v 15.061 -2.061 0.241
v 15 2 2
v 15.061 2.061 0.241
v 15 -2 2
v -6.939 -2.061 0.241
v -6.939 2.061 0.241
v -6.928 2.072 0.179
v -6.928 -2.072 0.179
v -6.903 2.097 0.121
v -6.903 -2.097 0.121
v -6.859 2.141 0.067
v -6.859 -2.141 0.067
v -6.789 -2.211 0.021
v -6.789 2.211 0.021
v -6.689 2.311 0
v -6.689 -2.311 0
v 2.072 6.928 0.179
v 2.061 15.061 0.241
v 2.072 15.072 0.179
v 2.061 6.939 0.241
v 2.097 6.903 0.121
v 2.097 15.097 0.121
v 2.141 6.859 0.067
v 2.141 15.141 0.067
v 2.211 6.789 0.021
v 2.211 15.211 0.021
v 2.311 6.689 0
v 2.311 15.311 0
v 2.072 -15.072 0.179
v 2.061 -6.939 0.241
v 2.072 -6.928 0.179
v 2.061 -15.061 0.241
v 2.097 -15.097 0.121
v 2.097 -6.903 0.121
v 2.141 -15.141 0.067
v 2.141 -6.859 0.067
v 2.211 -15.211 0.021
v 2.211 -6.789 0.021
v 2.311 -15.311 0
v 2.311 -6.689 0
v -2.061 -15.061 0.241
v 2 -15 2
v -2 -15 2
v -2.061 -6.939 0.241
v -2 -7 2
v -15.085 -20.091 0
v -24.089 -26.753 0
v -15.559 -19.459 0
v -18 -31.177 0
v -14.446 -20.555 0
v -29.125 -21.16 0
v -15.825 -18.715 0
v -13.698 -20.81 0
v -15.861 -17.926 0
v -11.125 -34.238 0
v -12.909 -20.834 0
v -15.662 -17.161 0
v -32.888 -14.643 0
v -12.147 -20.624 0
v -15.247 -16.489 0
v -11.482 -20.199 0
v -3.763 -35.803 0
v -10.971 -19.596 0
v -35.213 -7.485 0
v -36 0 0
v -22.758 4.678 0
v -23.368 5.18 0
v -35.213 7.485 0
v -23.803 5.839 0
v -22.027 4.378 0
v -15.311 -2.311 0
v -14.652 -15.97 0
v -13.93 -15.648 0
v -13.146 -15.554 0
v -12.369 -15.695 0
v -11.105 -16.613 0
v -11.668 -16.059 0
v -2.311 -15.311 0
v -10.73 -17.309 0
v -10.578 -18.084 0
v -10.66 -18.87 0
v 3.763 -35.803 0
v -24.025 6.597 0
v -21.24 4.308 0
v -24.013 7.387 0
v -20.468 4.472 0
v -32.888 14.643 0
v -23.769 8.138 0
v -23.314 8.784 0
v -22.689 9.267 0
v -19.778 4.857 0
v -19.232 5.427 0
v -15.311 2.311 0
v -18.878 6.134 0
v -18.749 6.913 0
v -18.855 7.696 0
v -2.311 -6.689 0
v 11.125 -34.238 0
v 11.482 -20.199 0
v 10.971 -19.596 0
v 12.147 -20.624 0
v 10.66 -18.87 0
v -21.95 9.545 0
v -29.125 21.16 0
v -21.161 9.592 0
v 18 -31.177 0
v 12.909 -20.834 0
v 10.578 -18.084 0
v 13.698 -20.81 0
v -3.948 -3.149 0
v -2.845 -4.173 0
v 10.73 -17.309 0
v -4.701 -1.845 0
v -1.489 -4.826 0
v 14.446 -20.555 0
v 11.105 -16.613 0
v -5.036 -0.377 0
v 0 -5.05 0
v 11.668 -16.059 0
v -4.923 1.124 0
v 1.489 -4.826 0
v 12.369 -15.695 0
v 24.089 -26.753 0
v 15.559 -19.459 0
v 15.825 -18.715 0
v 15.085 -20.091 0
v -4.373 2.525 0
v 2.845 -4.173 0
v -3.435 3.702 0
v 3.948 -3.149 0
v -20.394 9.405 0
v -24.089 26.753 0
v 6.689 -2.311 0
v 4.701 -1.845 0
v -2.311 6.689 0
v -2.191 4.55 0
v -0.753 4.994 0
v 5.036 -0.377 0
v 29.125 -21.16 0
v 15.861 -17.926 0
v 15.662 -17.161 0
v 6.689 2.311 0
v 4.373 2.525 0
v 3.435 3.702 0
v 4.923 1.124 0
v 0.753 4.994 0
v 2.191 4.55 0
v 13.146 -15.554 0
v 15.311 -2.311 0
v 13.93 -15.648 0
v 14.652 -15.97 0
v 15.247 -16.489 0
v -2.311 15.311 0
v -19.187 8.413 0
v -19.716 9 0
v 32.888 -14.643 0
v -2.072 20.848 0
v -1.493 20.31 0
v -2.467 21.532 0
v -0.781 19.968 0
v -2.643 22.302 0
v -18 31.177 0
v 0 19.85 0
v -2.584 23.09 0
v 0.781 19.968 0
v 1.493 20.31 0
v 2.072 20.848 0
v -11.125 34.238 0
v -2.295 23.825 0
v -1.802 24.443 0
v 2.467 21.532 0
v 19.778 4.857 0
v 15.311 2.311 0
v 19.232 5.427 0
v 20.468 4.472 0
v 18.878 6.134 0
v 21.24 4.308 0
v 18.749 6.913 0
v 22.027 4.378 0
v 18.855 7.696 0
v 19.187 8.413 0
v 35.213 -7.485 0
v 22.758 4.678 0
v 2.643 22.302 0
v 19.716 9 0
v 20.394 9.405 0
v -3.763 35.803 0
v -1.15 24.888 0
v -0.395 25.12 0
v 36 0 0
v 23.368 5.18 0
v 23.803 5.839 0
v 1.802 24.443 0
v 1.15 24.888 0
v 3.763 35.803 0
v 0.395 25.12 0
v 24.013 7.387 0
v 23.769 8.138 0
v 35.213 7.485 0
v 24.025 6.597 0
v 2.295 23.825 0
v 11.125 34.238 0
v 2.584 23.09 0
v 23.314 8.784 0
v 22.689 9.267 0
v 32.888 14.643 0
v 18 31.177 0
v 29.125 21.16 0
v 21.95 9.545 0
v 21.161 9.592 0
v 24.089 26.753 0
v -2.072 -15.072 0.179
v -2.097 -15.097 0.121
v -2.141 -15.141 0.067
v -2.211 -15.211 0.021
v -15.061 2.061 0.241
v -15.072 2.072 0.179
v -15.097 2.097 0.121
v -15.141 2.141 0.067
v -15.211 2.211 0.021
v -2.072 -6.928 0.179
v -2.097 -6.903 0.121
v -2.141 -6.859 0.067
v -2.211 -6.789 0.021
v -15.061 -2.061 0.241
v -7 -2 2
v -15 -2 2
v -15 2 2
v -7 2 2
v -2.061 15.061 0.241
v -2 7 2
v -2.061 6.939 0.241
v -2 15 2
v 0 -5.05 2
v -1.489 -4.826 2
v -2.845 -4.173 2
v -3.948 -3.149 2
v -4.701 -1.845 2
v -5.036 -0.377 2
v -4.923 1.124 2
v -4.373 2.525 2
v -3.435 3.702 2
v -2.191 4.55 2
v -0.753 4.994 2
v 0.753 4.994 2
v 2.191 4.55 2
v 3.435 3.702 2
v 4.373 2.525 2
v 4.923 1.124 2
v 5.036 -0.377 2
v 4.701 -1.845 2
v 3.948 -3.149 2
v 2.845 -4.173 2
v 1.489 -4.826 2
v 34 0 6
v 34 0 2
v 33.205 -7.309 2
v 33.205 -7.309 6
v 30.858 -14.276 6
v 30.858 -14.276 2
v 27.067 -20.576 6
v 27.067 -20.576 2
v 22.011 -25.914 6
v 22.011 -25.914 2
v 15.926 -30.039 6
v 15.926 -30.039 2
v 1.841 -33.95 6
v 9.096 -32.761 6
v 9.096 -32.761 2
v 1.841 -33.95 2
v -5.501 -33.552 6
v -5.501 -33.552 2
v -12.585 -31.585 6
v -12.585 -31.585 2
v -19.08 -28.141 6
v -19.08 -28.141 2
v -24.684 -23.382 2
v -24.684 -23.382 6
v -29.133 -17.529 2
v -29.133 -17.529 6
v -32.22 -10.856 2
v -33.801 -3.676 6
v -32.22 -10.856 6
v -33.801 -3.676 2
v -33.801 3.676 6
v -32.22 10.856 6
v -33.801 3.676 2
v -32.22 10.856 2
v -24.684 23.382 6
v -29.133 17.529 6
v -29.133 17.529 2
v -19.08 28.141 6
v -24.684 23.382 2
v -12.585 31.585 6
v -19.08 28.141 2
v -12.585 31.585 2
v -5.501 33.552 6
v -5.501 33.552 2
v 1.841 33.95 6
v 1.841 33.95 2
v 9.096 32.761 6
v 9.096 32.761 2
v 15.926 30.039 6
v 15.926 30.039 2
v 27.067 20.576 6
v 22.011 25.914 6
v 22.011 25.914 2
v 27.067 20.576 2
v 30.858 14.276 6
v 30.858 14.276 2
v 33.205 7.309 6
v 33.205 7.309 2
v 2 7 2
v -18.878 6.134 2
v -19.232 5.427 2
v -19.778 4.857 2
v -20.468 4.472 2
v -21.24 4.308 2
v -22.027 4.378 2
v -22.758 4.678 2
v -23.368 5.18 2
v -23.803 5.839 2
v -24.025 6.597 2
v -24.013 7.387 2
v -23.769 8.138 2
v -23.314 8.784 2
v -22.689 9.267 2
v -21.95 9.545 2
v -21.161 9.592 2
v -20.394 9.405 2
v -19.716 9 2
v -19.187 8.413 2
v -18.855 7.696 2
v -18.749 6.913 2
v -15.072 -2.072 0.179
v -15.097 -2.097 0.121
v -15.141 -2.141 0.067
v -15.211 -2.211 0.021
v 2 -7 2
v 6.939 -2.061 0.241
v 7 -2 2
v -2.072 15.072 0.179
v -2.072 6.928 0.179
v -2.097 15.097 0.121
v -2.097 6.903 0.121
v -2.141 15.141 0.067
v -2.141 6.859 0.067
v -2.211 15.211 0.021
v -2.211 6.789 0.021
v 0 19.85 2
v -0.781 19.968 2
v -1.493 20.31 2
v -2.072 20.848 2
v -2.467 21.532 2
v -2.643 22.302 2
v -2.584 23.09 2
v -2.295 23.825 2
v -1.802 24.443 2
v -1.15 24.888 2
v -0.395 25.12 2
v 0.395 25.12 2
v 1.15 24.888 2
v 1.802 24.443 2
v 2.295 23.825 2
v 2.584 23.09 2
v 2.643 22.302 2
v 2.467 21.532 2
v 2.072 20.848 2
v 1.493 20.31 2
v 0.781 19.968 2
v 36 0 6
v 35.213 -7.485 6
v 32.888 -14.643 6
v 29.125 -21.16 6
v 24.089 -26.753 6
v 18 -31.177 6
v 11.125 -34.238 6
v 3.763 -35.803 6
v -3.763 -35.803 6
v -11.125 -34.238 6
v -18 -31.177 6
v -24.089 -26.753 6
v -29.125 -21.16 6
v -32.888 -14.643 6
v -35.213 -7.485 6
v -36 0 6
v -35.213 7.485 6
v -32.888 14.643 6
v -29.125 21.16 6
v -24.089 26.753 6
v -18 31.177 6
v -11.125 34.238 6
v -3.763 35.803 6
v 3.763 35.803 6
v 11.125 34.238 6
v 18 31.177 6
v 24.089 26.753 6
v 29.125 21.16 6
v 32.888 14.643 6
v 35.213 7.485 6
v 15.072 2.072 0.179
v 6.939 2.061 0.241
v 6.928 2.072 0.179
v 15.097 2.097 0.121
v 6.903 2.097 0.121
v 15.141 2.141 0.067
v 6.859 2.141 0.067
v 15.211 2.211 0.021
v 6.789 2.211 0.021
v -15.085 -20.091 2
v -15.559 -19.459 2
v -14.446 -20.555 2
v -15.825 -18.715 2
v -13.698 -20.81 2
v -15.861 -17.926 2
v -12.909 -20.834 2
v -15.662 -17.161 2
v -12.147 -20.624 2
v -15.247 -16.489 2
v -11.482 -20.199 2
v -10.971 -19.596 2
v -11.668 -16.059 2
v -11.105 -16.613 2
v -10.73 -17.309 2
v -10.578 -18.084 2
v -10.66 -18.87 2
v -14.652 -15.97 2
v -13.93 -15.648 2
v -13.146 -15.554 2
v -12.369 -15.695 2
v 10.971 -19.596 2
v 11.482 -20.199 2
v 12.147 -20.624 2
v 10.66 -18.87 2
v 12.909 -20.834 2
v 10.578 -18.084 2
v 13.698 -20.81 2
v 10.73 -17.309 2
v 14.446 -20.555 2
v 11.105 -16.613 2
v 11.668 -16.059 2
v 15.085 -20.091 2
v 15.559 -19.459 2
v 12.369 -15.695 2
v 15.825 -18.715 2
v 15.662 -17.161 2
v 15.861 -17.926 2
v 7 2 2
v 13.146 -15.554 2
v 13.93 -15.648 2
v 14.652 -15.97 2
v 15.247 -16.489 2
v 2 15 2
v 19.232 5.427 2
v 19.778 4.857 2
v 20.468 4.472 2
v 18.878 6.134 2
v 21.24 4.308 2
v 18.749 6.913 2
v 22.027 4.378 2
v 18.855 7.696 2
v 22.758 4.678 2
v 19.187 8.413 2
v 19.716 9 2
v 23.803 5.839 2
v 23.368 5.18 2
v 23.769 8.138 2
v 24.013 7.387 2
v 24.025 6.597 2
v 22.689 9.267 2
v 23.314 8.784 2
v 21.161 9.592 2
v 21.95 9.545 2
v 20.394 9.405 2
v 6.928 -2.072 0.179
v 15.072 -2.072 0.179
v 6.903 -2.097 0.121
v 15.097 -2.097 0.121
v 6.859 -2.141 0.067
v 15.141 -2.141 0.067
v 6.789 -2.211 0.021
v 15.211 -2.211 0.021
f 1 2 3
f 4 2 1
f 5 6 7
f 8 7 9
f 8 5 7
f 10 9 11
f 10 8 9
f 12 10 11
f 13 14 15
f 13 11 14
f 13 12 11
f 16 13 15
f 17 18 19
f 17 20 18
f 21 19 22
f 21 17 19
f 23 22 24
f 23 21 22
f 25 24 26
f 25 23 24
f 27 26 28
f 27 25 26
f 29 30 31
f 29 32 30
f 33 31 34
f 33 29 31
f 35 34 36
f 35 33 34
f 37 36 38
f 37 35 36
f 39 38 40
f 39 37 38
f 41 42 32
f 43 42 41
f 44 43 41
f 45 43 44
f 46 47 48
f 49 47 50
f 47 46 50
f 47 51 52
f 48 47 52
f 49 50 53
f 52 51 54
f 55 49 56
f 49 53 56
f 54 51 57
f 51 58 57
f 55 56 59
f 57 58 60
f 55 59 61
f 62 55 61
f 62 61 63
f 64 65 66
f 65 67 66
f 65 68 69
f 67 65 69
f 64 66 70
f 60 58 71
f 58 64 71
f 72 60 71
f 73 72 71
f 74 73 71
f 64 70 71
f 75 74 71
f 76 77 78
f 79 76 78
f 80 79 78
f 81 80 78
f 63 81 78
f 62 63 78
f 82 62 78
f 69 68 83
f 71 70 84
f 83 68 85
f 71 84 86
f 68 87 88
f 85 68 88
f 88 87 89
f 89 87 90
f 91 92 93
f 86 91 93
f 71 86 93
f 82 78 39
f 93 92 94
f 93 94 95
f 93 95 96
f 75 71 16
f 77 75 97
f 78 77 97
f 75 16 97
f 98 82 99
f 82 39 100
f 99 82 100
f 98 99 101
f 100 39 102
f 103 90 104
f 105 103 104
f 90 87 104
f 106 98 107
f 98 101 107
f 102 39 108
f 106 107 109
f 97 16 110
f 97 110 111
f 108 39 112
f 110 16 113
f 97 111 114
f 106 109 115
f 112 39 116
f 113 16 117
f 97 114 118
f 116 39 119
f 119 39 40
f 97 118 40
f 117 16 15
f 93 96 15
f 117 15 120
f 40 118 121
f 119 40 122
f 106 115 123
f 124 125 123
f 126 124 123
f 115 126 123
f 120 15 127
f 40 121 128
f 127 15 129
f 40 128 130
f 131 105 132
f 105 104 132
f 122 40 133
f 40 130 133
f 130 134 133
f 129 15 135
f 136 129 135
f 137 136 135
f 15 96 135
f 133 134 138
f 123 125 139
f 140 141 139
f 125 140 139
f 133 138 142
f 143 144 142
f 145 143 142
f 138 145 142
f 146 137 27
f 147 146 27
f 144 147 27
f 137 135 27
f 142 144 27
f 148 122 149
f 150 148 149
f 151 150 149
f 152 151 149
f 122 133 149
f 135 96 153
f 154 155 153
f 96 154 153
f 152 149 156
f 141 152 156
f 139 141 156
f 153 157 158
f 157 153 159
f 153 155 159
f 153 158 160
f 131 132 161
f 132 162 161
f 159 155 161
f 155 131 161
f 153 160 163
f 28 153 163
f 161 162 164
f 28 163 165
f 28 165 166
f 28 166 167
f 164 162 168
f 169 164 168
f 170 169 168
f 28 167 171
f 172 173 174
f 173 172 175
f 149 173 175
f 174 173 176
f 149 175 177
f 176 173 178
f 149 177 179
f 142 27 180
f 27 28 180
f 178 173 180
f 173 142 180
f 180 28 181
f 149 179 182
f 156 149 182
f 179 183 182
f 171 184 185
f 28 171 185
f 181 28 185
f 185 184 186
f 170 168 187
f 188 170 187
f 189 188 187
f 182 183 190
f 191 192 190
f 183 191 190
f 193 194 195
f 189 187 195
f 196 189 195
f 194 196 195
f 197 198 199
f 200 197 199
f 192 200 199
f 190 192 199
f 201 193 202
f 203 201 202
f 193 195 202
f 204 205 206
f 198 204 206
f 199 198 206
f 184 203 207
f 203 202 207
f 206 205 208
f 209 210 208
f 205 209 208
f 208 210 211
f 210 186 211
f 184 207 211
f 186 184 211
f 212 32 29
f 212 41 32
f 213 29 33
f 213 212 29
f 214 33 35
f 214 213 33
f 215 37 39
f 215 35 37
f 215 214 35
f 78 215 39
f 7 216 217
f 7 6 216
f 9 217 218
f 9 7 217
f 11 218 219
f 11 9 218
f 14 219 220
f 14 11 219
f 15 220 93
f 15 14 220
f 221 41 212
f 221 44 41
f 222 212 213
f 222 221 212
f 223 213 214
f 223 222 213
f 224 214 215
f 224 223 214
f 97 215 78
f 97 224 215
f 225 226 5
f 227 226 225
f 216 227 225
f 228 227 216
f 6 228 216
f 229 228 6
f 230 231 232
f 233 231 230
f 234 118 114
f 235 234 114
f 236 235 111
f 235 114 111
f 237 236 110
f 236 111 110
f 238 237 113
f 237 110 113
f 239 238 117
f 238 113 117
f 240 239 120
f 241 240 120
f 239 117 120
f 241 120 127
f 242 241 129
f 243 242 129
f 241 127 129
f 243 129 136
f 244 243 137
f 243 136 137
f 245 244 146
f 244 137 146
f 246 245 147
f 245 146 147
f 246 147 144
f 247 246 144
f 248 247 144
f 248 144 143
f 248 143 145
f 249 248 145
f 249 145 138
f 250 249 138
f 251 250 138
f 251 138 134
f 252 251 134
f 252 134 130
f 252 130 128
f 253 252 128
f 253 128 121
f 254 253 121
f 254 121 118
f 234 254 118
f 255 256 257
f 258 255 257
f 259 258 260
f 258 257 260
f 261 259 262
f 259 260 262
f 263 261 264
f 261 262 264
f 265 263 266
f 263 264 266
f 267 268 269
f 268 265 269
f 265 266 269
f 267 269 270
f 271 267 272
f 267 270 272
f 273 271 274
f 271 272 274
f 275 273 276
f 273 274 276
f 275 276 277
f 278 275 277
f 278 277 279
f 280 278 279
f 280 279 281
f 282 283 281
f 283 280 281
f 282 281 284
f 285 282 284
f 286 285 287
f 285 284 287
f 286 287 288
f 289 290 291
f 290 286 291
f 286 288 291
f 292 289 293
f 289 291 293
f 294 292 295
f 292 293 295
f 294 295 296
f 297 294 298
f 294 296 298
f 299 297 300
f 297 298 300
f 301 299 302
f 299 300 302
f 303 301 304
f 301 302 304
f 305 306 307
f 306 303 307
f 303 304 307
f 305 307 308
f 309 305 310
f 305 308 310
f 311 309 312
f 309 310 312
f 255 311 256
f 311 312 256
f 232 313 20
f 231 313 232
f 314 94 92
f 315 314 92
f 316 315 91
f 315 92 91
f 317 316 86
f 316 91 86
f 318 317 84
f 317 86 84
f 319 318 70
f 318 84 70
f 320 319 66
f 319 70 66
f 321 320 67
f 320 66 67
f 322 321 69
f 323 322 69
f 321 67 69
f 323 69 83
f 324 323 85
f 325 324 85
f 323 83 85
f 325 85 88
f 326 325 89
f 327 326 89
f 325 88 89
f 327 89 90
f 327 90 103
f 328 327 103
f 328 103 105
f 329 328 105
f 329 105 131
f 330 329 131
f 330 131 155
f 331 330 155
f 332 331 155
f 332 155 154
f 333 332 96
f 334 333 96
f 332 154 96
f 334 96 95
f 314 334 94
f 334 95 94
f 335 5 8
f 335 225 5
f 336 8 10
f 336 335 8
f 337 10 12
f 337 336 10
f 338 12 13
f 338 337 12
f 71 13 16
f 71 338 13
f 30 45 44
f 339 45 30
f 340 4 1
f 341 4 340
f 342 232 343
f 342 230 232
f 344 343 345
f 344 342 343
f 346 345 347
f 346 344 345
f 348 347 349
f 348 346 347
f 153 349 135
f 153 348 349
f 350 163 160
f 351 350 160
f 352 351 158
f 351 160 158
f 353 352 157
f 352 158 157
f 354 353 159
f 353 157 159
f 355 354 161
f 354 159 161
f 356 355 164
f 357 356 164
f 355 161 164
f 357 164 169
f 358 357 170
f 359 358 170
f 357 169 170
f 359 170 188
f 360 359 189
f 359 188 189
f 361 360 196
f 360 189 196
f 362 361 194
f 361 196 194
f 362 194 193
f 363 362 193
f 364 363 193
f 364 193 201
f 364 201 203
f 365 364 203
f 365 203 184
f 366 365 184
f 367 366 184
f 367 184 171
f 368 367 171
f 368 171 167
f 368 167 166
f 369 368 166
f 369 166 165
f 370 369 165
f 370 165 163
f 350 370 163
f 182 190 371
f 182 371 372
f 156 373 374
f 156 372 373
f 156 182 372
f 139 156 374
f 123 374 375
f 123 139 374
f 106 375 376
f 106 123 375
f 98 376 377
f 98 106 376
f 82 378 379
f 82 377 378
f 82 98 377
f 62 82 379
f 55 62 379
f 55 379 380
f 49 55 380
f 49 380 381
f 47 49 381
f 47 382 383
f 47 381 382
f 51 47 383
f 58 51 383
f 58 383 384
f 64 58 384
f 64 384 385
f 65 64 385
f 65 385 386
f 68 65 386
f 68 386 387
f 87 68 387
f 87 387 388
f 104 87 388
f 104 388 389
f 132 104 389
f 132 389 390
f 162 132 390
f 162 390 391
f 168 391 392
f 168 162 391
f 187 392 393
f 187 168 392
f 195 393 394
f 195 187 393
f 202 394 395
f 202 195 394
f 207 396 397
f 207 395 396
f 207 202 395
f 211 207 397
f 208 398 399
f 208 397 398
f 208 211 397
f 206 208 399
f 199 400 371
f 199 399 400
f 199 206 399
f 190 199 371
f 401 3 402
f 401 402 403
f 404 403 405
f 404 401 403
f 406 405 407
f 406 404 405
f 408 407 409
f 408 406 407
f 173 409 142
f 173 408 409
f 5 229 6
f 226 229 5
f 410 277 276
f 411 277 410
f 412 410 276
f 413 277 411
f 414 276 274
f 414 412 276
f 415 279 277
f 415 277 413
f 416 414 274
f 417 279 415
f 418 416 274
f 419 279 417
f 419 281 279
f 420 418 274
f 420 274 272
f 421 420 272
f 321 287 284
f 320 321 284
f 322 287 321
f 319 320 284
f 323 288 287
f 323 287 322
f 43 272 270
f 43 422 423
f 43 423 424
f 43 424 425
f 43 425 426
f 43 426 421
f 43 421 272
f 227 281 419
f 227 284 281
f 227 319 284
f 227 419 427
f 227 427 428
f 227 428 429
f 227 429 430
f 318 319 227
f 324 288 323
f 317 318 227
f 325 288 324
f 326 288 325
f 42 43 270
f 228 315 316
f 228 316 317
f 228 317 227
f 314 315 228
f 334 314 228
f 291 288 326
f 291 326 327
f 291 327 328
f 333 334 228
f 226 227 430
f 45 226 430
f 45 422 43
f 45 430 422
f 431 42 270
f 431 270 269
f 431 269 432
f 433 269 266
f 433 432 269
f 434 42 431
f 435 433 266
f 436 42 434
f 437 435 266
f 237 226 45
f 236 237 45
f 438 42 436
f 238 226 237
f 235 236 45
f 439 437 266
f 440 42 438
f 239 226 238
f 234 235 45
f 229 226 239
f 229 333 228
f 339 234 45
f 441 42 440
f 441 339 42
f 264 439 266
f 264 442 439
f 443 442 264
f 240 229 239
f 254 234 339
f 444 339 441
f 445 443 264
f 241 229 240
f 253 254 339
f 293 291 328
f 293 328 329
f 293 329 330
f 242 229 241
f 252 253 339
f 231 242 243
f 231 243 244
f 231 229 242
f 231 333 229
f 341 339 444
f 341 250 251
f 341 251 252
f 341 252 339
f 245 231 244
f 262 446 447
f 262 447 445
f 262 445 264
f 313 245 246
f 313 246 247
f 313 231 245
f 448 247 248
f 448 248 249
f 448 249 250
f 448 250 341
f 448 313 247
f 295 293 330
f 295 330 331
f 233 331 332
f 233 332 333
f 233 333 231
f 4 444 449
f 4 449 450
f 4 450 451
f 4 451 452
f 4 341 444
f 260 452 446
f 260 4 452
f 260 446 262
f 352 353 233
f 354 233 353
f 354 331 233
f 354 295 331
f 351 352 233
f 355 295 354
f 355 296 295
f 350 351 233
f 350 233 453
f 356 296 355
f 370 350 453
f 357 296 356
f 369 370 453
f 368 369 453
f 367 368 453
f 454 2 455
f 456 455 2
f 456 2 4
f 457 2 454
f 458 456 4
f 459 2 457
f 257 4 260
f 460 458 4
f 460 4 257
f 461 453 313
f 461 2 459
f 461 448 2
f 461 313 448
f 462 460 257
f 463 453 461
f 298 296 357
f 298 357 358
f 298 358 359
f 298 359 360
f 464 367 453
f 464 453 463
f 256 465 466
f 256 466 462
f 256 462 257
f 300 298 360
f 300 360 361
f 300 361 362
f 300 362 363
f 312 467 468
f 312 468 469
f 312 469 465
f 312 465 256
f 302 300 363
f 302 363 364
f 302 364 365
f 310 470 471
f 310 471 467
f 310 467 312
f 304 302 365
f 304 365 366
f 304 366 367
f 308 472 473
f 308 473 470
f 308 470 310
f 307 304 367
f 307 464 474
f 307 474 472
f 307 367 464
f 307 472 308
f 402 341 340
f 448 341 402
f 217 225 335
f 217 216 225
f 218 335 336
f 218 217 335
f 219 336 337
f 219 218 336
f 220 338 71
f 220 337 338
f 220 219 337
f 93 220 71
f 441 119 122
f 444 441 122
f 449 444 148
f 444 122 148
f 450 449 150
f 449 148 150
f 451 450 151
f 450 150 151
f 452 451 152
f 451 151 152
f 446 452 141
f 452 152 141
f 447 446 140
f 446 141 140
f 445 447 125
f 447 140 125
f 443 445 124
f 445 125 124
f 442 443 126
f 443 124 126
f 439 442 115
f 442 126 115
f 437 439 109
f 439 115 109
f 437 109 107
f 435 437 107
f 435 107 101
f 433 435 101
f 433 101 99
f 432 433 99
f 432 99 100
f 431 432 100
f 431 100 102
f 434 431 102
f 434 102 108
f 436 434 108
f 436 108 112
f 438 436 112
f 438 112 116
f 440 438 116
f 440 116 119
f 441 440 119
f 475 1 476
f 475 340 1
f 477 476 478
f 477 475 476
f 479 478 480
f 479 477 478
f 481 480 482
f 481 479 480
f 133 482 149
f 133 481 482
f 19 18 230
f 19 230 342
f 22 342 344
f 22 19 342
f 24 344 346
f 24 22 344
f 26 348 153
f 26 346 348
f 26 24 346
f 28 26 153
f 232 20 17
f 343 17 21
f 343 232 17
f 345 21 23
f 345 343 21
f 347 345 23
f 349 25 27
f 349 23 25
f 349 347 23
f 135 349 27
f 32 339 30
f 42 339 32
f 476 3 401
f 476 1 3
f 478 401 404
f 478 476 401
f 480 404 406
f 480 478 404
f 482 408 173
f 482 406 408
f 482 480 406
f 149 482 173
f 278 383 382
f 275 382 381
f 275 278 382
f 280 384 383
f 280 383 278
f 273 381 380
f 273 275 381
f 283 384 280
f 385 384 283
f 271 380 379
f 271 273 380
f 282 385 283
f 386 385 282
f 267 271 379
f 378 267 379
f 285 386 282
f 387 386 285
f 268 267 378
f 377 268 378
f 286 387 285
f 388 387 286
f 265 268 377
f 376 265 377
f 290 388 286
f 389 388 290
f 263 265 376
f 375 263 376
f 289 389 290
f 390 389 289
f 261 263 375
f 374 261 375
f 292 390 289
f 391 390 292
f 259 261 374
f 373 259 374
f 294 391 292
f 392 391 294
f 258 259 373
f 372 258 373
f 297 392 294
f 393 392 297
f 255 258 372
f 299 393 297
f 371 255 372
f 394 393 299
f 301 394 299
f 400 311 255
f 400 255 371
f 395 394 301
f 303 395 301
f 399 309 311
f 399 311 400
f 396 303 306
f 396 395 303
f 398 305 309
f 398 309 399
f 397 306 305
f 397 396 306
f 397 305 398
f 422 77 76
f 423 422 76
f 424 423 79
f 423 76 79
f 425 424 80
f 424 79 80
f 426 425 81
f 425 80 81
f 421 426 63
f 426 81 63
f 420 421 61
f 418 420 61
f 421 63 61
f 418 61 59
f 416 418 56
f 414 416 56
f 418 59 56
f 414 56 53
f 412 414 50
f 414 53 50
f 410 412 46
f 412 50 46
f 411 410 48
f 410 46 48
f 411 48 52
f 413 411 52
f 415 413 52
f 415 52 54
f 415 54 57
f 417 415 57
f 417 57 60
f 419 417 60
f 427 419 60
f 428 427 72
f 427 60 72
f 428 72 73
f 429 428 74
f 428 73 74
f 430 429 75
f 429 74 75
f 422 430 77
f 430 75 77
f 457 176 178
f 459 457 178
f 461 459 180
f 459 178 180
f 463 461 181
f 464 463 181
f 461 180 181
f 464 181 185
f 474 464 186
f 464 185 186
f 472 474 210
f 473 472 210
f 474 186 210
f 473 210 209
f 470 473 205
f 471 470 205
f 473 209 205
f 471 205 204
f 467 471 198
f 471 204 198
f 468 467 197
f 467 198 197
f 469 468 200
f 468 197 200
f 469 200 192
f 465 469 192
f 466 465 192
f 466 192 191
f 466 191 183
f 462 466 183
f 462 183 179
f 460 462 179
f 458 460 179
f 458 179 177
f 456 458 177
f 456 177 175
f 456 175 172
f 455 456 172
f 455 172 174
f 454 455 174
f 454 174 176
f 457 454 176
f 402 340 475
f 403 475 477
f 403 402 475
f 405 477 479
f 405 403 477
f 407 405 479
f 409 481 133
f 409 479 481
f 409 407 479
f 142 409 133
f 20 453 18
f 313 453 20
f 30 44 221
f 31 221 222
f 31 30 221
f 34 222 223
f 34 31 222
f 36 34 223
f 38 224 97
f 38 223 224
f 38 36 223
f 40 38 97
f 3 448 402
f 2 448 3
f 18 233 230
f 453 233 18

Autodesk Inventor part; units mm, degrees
ref_plane "YZ Plane" through (0, 0, 0) normal (1, 0, 0) x (0, 1, 0)
ref_plane "XZ Plane" through (0, 0, 0) normal (0, 1, 0) x (-1, 0, 0)
ref_plane "XY Plane" through (0, 0, 0) normal (0, 0, 1) x (1, 0, 0)
sketch "Sketch1" plane through (0, 0, 0) normal (0, 0, 1) x (1, 0, 0)
  circle A0 centre (0, 0) radius 36
  dimension "d0" = 72
extrude "Extrusion1" add sketch "Sketch1" along normal blind 2
sketch "Sketch2" plane through (0, 0, 2) normal (0, 0, 1) x (1, 0, 0)
  circle A0 centre (0, 0) radius 36 projected
  circle A1 centre (0, 0) radius 34
  dimension "d3" = 2
extrude "Extrusion2" add sketch "Sketch2" along normal blind 4
sketch "Sketch4" plane through (0, 0, 2) normal (0, 0, 1) x (1, 0, 0)
  point P0 (0, 0)
  point P1 (0, 0)
hole "Hole1" at (0, 0, 2) direction (0, 0, -1) diameter 10.1 end through all
sketch "Sketch5" plane through (0, 0, 2) normal (0, 0, 1) x (1, 0, 0)
  point P0 (0, 0)
  point P1 (0, 22.5)
  dimension "d13" = 22.5
hole "Hole2" at (0, 22.5, 2) direction (0, 0, -1) diameter 5.3 end through all
pattern_circular "Circular Pattern1" count 5 over 360 about axis through (0, 0, -100) along (0, 0, 1) of "Hole2"
sketch "Sketch8" plane through (0, 0, 2) normal (0, 0, 1) x (1, 0, 0)
  circle A0 centre (21.3988, 6.9529) radius 2.65 projected
  circle A1 centre (13.2252, -18.2029) radius 2.65 projected
  circle A2 centre (-13.2252, -18.2029) radius 2.65 projected
  circle A3 centre (-21.3988, 6.9529) radius 2.65 projected
  circle A4 centre (0, 22.5) radius 2.65 projected
  circle A5 centre (0, 0) radius 5.05 projected
  circle A6 centre (0, 0) radius 34 projected
  line L0 (-2, 15) -> (2, 15)
  line L1 (2, 15) -> (2, 7)
  line L2 (2, 7) -> (-2, 7)
  line L3 (-2, 7) -> (-2, 15)
  dimension "d43" = 4
  dimension "d44" = 8
  dimension "d45" = 7
  dimension "d48" = 2
extrude "Extrusion5" cut sketch "Sketch8" against normal up to surface (2 mm away) draft 2 contours L0 L1 L2 L3
fillet "Fillet2" radius 0.25 4 edges at (0, 6.9302, 0) (2.0698, 11, 0) (0, 15.0698, 0) (-2.0698, 11, 0)
pattern_circular "Circular Pattern3" count 4 over 360 about axis through (0, 0, -100) along (0, 0, 1) of "Extrusion5", "Fillet2"
equation "\"d0\" = W_innerDiameter + W_wallThickness"
equation "\"d1\" = W_wallThickness"
equation "\"d3\" = W_wallThickness"
equation "\"d4\" = W_innerDepth"
equation "\"d6\" = W_innerGearHoleDiameter"
equation "\"d13\" = OG_distanceFromCenter"
equation "\"d14\" = W_outerGearHoleDiameter"
equation "\"W_wallThickness\" = 2"
equation "\"W_innerDepth\" = 4"
equation "\"W_innerGearHoleDiameter\" = 10.1"
equation "\"W_outerGearHoleDiameter\" = 5.3"
equation "\"OG_distanceFromCenter\" = 22.5"
equation "\"W_innerDiameter\" = 70"
equation "\"Wheel_Related_W_\" = 0"
equation "\"W_holesClearance\" = 0.3"
equation "\"TempSpotReserved7\" = 0"
equation "\"TempSpotReserved8\" = 0"
equation "\"TempSpotReserved9\" = 0"
equation "\"TempSpotReserved10\" = 0"
equation "\"TempSpotReserved11\" = 0"
equation "\"TempSpotReserved12\" = 0"
equation "\"TempSpotReserved13\" = 0"
equation "\"TempSpotReserved14\" = 0"
equation "\"TempSpotReserved15\" = 0"
equation "\"TempSpotReserved16\" = 0"
equation "\"TempSpotReserved17\" = 0"
equation "\"TempSpotReserved18\" = 0"
equation "\"TempSpotReserved19\" = 0"
equation "\"TempSpotReserved20\" = 0"
equation "\"Inner_Gear_Related_IG_\" = 0"
equation "\"IG_shaftDiameter\" = 7.5"
equation "\"IG_shaftLength\" = 17"
equation "\"IG_gearThickness\" = 2"
equation "\"TempSpotReserved25\" = 0"
equation "\"TempSpotReserved26\" = 0"
equation "\"TempSpotReserved27\" = 0"
equation "\"TempSpotReserved28\" = 0"
equation "\"TempSpotReserved29\" = 0"
equation "\"TempSpotReserved30\" = 0"
equation "\"TempSpotReserved31\" = 0"
equation "\"TempSpotReserved32\" = 0"
equation "\"TempSpotReserved33\" = 0"
equation "\"TempSpotReserved34\" = 0"
equation "\"TempSpotReserved35\" = 0"
equation "\"TempSpotReserved36\" = 0"
equation "\"TempSpotReserved37\" = 0"
equation "\"TempSpotReserved38\" = 0"
equation "\"TempSpotReserved39\" = 0"
equation "\"TempSpotReserved40\" = 0"
equation "\"Outer_Gear_Related_OG_\" = 0"
equation "\"OG_shaftDiameter\" = 5"
equation "\"OG_gearDiameter\" = 25"
equation "\"OG_shaftLength\" = 9"
equation "\"OG_gearThickness\" = 2"
equation "\"TempSpotReserved47\" = 0"
equation "\"TempSpotReserved48\" = 0"
equation "\"TempSpotReserved49\" = 0"
equation "\"TempSpotReserved50\" = 0"
equation "\"TempSpotReserved51\" = 0"
equation "\"TempSpotReserved52\" = 0"
equation "\"TempSpotReserved53\" = 0"
equation "\"TempSpotReserved54\" = 0"
equation "\"TempSpotReserved55\" = 0"
equation "\"TempSpotReserved56\" = 0"
equation "\"TempSpotReserved57\" = 0"
equation "\"TempSpotReserved58\" = 0"
equation "\"TempSpotReserved59\" = 0"
equation "\"TempSpotReserved60\" = 0"
equation "\"Leg_Extensions_Related_LE_\" = 0"
equation "\"LE_baseDiameter\" = 5"
equation "\"LE_maxLength\" = 23.67256"
equation "\"LE_thickness\" = 2.5"
equation "\"IG_ratioToOuterGear\" = 1.25"
equation "\"B_bearingThickness\" = 1"
equation "\"TempSpotReserved43\" = 0"
equation "\"TempSpotReserved45\" = 0"
equation "\"Thisisatest\" = 25.4"
equation "\"TempSpotReserved46\" = 0"
equation "\"TempSpotReserved44\" = 0"
equation "\"LE_offsetAboveOuterGear\" = 0"
equation "\"Bearing_Related_B_\" = 0"
equation "\"TempSpotReserved42\" = 0"
equation "\"OG_skirtOffset\" = 5"
equation "\"OG_skirtThickness\" = 1"
equation "\"IG_skirtThickness\" = 2"
equation "\"IG_extentionLength\" = 19.5"
equation "\"IG_extentionThickness\" = 3"
equation "\"IG_slitWidth\" = 4"
equation "\"IG_slitlength\" = 8"
equation "\"IG_slitClearance\" = 0.2"
equation "\"IG_slitDistanceFromCenterHole\" = 7"
equation "\"Reserved_10\" = 0"
equation "\"Reserved_9\" = 0"
equation "\"Reserved_11\" = 0"
equation "\"Reserved_12\" = 0"
equation "\"Reserved_8\" = 0"
equation "\"Reserved_7\" = 0"
equation "\"Reserved_26\" = 0"
equation "\"Reserved_20\" = 0"
equation "\"Reserved_22\" = 0"
equation "\"Reserved_23\" = 0"
equation "\"Reserved_25\" = 0"
equation "\"Reserved_24\" = 0"
equation "\"Reserved_21\" = 0"
equation "\"Reserved_19\" = 0"
equation "\"Reserved_27\" = 0"
equation "\"Reserved_14\" = 0"
equation "\"Reserved_15\" = 0"
equation "\"Reserved_16\" = 0"
equation "\"Reserved_13\" = 0"
equation "\"Reserved_17\" = 0"
equation "\"Reserved_18\" = 0"
equation "\"Bearing_Related_BR_\" = 0"
equation "\"BR_bearingThickness\" = 1"
equation "\"Block_Related_BL_\" = 0"
equation "\"BL_width\" = 3.8"
equation "\"BL_length\" = 7.8"
equation "\"W_filletRadius\" = 0.25"
equation "\"W_extrutsionTaperAngle\" = 2deg"
equation "\"OG_protrudeDistance\" = 3"
equation "\"IG_dAxleDepth\" = 5"
equation "\"IG_dAxleShort\" = 1.5"
equation "\"IG_dAxleCircleDiameter\" = 2"
equation "\"IG_gearRatio\" = 1.25"
properties part number "wheel"
